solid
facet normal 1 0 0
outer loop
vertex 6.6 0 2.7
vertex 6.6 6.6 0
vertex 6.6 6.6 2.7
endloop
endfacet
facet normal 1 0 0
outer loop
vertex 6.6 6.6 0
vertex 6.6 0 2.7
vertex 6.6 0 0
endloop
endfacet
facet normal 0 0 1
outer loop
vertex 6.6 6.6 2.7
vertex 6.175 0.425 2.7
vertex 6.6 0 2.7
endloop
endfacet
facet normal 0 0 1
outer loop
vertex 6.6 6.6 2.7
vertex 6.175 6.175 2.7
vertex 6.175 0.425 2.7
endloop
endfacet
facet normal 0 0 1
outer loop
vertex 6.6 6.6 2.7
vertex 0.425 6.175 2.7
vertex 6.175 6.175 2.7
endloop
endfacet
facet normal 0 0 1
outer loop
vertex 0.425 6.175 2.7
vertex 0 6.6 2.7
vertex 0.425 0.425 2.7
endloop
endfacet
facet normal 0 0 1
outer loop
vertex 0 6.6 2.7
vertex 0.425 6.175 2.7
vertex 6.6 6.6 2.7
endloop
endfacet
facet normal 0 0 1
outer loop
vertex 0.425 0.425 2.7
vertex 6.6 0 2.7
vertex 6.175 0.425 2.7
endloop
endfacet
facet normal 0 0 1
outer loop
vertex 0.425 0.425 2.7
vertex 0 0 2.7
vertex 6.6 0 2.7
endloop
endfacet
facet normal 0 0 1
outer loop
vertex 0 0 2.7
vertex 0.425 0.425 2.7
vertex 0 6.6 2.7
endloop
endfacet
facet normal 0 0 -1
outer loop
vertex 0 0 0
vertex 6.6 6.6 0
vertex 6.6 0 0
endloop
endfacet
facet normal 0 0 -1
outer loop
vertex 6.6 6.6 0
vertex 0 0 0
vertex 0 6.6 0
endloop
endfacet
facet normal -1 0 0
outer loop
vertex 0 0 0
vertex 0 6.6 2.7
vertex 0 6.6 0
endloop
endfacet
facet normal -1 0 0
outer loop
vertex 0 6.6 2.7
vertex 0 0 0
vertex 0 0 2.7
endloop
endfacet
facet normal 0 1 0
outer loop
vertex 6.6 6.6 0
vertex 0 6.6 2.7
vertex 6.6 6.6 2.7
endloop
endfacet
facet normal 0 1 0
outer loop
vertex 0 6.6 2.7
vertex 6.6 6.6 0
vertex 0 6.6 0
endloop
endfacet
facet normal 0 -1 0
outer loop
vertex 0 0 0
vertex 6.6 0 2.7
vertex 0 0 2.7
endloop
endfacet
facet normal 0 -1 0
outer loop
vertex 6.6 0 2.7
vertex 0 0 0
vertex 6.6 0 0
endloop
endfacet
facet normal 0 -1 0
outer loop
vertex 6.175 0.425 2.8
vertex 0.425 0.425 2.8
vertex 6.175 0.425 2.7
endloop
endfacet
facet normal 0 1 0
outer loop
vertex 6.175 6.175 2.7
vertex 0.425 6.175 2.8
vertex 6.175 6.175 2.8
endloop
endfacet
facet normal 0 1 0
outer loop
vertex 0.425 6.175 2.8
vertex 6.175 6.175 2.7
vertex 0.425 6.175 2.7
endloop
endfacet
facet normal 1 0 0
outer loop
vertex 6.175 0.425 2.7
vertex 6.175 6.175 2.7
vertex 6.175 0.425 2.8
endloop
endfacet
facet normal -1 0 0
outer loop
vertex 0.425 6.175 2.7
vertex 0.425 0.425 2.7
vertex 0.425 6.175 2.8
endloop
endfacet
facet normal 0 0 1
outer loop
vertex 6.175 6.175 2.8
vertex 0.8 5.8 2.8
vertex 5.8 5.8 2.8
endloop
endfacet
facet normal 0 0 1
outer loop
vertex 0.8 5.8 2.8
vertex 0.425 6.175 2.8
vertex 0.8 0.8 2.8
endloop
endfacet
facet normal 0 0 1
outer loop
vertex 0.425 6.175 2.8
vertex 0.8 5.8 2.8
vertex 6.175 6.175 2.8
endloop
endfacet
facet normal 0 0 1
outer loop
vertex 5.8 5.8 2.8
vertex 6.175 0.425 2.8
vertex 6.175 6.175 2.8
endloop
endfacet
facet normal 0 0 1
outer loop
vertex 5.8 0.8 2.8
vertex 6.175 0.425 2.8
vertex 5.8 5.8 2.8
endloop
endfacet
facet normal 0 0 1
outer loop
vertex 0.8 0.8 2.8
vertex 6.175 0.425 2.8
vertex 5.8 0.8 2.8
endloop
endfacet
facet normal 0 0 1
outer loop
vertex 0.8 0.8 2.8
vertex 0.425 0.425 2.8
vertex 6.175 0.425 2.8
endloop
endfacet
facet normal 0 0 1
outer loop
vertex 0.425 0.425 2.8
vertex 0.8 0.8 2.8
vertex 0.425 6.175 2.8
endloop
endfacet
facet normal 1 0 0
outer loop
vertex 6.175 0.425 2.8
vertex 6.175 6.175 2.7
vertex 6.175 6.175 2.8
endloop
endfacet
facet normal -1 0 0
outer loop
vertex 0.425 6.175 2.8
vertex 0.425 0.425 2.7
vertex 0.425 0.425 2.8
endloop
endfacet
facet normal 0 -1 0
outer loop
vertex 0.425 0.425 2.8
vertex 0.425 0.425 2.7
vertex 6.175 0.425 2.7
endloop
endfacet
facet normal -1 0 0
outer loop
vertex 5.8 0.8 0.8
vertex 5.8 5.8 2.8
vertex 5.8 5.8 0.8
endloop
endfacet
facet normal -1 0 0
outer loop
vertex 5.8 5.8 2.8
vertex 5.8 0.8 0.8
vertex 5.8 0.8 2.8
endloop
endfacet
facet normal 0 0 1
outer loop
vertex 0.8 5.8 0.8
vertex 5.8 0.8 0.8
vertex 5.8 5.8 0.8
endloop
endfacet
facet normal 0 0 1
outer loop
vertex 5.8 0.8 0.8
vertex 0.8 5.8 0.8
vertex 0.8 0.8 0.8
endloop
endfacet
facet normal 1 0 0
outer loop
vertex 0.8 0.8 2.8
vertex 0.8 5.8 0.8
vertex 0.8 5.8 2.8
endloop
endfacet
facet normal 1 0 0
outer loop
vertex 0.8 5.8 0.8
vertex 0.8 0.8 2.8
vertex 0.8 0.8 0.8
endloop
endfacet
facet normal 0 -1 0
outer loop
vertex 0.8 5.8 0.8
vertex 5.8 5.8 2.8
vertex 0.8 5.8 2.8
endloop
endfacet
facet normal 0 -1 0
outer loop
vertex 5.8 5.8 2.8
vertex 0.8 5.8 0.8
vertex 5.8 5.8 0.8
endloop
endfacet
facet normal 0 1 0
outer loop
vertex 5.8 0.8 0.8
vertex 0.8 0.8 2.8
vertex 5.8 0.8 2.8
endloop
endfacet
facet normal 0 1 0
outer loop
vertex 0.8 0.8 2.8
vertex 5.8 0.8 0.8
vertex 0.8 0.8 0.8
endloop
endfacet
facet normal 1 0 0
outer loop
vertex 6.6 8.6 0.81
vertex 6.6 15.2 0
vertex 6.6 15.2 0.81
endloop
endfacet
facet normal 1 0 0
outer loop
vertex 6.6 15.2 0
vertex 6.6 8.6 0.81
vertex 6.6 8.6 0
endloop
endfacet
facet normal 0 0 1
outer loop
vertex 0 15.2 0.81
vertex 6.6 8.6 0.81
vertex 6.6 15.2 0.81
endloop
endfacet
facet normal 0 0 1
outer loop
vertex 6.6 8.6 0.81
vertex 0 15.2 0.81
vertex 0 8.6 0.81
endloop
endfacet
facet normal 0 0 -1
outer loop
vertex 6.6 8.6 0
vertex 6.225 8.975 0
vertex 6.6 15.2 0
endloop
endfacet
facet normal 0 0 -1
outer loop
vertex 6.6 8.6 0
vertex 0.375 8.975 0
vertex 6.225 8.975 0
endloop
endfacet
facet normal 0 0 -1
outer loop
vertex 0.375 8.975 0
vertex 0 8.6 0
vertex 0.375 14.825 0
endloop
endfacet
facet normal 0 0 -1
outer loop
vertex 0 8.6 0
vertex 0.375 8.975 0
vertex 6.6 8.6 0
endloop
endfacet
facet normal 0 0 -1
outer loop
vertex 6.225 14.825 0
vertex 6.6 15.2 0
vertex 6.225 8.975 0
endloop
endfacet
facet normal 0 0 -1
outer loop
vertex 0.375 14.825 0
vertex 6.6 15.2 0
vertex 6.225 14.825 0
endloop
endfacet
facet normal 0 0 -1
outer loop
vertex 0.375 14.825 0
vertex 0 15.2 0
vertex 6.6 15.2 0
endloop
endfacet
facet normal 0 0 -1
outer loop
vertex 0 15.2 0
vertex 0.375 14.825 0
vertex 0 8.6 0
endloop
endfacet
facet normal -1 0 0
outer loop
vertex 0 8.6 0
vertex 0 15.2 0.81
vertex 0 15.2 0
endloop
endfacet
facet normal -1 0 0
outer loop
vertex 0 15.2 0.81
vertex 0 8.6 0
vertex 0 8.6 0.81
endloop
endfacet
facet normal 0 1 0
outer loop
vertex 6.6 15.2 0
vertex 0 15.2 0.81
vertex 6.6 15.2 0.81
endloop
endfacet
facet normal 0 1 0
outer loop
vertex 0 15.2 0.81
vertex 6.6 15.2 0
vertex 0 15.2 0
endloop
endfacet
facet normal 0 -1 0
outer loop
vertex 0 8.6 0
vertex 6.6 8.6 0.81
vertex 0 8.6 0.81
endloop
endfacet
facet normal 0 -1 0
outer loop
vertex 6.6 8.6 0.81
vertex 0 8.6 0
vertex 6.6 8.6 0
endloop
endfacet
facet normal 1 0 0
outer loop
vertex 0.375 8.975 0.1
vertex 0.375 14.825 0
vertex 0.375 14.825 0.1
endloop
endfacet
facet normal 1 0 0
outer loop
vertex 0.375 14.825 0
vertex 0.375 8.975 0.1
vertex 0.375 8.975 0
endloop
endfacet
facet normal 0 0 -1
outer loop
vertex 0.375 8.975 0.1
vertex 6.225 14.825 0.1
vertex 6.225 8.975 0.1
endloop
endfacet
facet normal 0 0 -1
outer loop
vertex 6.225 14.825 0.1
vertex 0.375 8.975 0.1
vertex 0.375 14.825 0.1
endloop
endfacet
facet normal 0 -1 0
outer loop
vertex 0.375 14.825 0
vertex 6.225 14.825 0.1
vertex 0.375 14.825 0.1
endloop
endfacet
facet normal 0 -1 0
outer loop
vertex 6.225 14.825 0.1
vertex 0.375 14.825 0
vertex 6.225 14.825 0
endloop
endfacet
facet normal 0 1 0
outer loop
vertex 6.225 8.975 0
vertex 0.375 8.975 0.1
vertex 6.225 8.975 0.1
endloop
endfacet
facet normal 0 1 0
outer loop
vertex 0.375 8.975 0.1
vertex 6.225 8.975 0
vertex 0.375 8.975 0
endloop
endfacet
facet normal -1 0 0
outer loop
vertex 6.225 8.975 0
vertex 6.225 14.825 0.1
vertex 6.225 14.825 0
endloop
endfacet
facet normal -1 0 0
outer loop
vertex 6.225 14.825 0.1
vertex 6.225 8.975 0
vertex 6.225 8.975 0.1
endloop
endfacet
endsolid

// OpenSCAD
/* [Dimensioni principali della scatola]*/
// Altezza interna della scatola
h = 0; //[0:1:200]
// Larghezza interna della scatola
l = 0; //[0:1:200]
// Profondità interna della scatola
p = 2; //[0.1:.1:200]
// espanzione addizionale della scatole in altezza e larghezza
tl = 5; //[0:10]
//spessore delle pareti (dovrebbe essere un multiplo dell'ugello)
mu = .8;//[0.8 :0.4:10]
/*[parametriper il dentino di chiusura della scatola]*/
// larghezza del dentino in percentuale della parete
pd = 0.5; //[0.1: 0.1: 1]
// altezza del dentino di bloccaggio
ad = .1; // [0.1: 0.1 : 5]
// taglio trasversale del dente in percentuale della parete
td = 0; //[0 : 0.1 : 20]
// tolleranza extra tra i dentini e il coperchio
ext = 0.05;

/* [Parametri cosmetici] */
// raggio di curvatura delle stondature
r = 0;//[0:0.1:30]
// Stondature a base
Btype = "F"; // [F:senza stondature, E:uguale alle stondature, B:base allungata]
// millimetri in altezza delle stondature alla base
b = 0;//[0:0.1:100]
// Stondatura coperchio
Ctype = "F"; // [F:senza stondature, E: uguale alle stondature, B: coperchio allungato]

/* [Opzioni del modello]*/
// componenti da tracciare
Rtype = "E"; // [E:entrambi affianchati, S:Solo scatola, C:Solo coperchio, Z:sovreppposti con sezionamemto]
//lunghezza minima dei segmenti di un arco in mm
fs = 0.4;//[0.2:0.1:3]
// indica il numero massimo di segmenti che una circoferenza può avere
fn = 40;//[10:100]

/* [Parametri di controllo] */
// grandezza minima
Ep = 0.01;
// dimenzione dell'ugello di stampa
ud = 0.4; // [0.1: 0.1 : 0.6]
// altezza del disco di riferimento dell'ugello 
uh = 0.12;
// posizione del disco di riferimento dell'ugello
up = [1,1,1]; //[0 : 0.01 : 200]
s2 = sqrt(2);

Main(Rtype,Btype,Ctype, l+tl, h+tl, p, mu, ad, r, b, $fs=fs, $fn=fn);
//Dentini([l+tl, h+tl, p], mu, ad, ext/2, pd, td);
//#Dentini(io=0.3);
//Dente();

/* Nota(1)
  in un'equazione di secondo grado [a*x^2+b*x+c = 0]
	se a = 1 e b è divisibile per due
	allora  x= -b/2 +- sqrt((b/2)^2 -c)
*/
/* Formula(1)
// raggio minimo dipendente dal bordo interno della scatola
ct = m - Ep
d = sqrt(2*(r - ct)^2) +-> r>=d 
=>
  se
    r - ct >= 0 cioè ct >= r // prima della riduzione
  allora
    r^2 >= 2*(r - ct)^2
    r >= sqrt(2)*(r - ct)
  altrimetni
    r == +inf
=> 
  r >= sqrt(2)*r - sqrt(2)*ct
  r- sqrt(2)*r >= -sqrt(2)*ct 
  r * (1-sqrt(2) >= -sqrt(2)*ct
  r >= -sqrt(2)*ct/(1-sqrt(2))
  r >= sqrt(2)*ct/(sqrt(2)-1)
*/
/* Formula(2)
// raggio minimo dipendente dal dentino sulla scatola
c1 = r -m +pd*m +ext/2 +Ep
   = r -(1-pd)*m +Ep +ext/2
c2 = r -m +pd*m -pd*td*m +ext/2 +Ep
   = r -(1-pd+pd*td)*m +Ep -ext/2
d  = sqrt(c1^2 +c2^2) +-> r>=d
=>
  d = sqrt((r -(1-pd)*m +Ep +ext/2)^2 + (r -(1-pd+pd*td)*m  +Ep +ext/2)^2)
  mx = -(1-pd)*m +Ep +ext/2
  my = -(1-pd+pd*td)*m  +Ep +ext/2
  d = sqrt((r + mx)^2 + (r + my)^2)
  se
    r+mx >= 0 // lapalissiana per costruzione a meno di epsilon
	mx <= 0 // l'epsilon ha portato il dentino oltre al raggio ma la costruzione è ancora valida, inoltre questo impone al radicando ad essere positivo
	r+my >= 0 cioè my >= -r // prima della riduzione
  allora
	  r^2 >= (r + mx)^2 + (r + my)^2
	  r^2 >= r^2 +2*mx*r + mx^2 + r^2 +2*my*r + my^2
	  0 >= r^2 +2*(mx+my)*r + mx^2 +my^2
	  r^2 +2*(mx+my)*r + mx^2 +my^2 <= 0
	  r = -(mx+my) +- sqrt( (mx+my)^2 -(mx^2 + my^2))

  altrimenti
    r == +inf
*/
/* Formula(3)
// calcoliamo l'altezza del bordo della scatola sulla curvatura
d = sqrt(2*(r - m)^2)
h = sqrt( r^2 - d^2 ) = sqrt( r^2 - 2*(r-m)^2)
// rapportiamo quest'altezza all'altezza massima impostabile in modo che sia uguale al muro

hm ((r-h+Ep)/r) <= m
se r-h+Ep <> 0 // dovrebbe essere sempre vero per come abbiamo scelto r e m prima
hm <= (m * r)/(r-h+Ep)
hm <= (m*r)/(r - sqrt( r^2 - 2*(r-m)^2) +Ep)
*/
/* Formula(4)
// altezza e stondatura del coperchio
	// se il coperchio deve essere senza stondature 
	//     l'altezza dello stesso è uguale all'altezza del dentino più l'altezza del muro
	//     l'allungamento della testa del coperchio è zero
	// se deve averre la stessa curvatura delle stondature
	//     l'allungamento ha la stessa dimesione della stondatura
	//     l'ltezza è uguale dentino più l'altezza per assorbire la stondatura (o l'altezza del muro se maggiore)
	//     si seguono più o meno gli stessi ragionamenti del raggio minimo dipendente dal dentino e l'altezza dell'allungamento
		c1 = r -m +pd*m +ext/2 +Ep
		   = r -(1-pd)*m +Ep +ext/2
		c2 = r -m +pd*m -pd*td*m +Ep +ext/2
		   = r -(1-pd+pd*tm)*m +Ep +ext/2
		d  = sqrt(c1^2 +c2^2)
		d = sqrt((r -(1-pd)*m +Ep +ext/2)^2 + (r -(1-pd+pd*td)*m +Ep +ext/2)^2)
		mx = -(1-pd)*m +Ep +ext/2
		my = -(1-pd+pd*td)*m  +Ep +ext/2
		d = sqrt((r + mx)^2 + (r + my)^2)
		h = sqrt( r^2 - d^2 )
	// se si deve avere una base allungata 
	//     l'allungamento segue un ragionamento simile altezza dell'allungamento della base
	//     l'altezza è uguale al dentino più il muro
		hm ((r-h+Ep)/r)<= m
		hm <= (m * r)/(r-h+Ep)
		hm <= (m * r)/(r-h+Ep)
*/
// Main
module Main(RT="E", BT="F", CT="F", x=10, y=10, z=10, m, dente, r=2, bs=2) {
  
  DI = [x, y, z];
  DE = ComposeOut(DI, m, dente);
  Provetta();

  // ************************************************************
  // le dimenzioni del muro limitano l'arrotondamento orizzontale
  //l'arrotondamento della scatola non può essere maggiore della metà della lunghezza o larghezza
  // ************************************************************
  // limite imposto dalle dimezioni della scatola
  ds = min(DE[0], DE[1])/2 -Ep; 
  // ************************************************************
  // limite agli stodamenti per la dimenzione del muro
  // ************************************************************
  // vedi formula(1)
  rm = m-Ep >=r ? 1/0 : (s2*(m-Ep))/(s2-1); 
  
  // ************************************************************
  // limite degli stondamenti per le impostazioni del dentino
  // ************************************************************
  // vedi formula(2)
  mx = min(0,-(1-pd)*m +Ep -ext/2);
  my = -(1-pd+pd*td)*m +Ep -ext/2;
  echo(Mx=mx,My=my);
  rd = my < -r ? 1/0 : (-(mx + my) + sqrt(pow(mx+my,2) - ((mx*mx) + (my*my))));
  
  echo(    "<b>Raggio Massimo<\b>");
  echo(str("<b>__per le dimensioni : </b>",ds));
  echo(str("<b>__per la scatola    : </b>",rm));
  echo(str("<b>__per il dentino    : </b>",rd));
  r1 = min(r, ds, rm, rd);
  
  // definito il raggio definiamo gli allungamenti
  
  // ************************************************************
  // allungamento massim della base
  // ************************************************************
  // vedi Formula(3)
  hb1 =  sqrt(r1*r1-2*pow(r1-m,2))/r1;
  bm1 = m/(1- hb1+Ep);
  echo(str("<b>Altezza Massima dell'allungamento alle base : </b>", bm1," [", hb1, "]"));
  
  bsm = BT == "F" ? 0: BT == "E" ? min(r1,bm1) : min(bs,bm1);
  
  // ************************************************************
  // allungamento massimo e altezza coperchio
  // ************************************************************
  // vedi Formula(4)
  cx = min(0,-(1-pd)*m +Ep +ext/2);
  cy = -(1-pd+pd*td)*m +Ep +ext/2;
  dc = pow(r1+cx, 2) + pow(r1+cy, 2);
  echo(Cx=cx,Cy=cy, Dc=dc, R = r1);
  hc = max(0,sqrt( pow(r1,2) - dc));
  bm2 = (m *r1)/(r1-hc+Ep);
  echo(str("<b>Altezza Massima dell'allungamento coperchio : </b>", bm2," [", hc, "]"));

  hb = max((CT == "E" ? max(m,r1-hc+Ep)+dente : CT == "B"? dente +m: r1+m), r1) +Ep;
  bc = CT == "F" ? 0 : CT == "B"? min(hb-Ep,bm2) : r1;  
  
  // ************************************************************
  // inizio direttive delle forme
  // ************************************************************
  
  if(RT == "E" || RT == "S" ) { Scatola(DI, m, dente, r1, bsm); }
  if(RT == "C")  Coperchio(DI, hb, m, dente, r1, bc);
  
  sx = DE[0]  < DE[1] ? DE[0]+2 : 0;
  sy = DE[1] <= DE[0] ? DE[1]+2 : 0;
  if(RT == "E") translate([sx , sy, 0]) Coperchio(DI, hb, m, dente, r1, bc);

  if(RT == "Z") {
    difference(){
      union() {
        Scatola(DI, m, dente, r1, bsm);
        translate([0, 0, DE[2]+dente*0.6]) Coperchio(DI, hb, m, dente, r1, bc);
      }
      translate ([-0.1, -0.1, -0.1]) cube([DE[0]/2, DE[1]/2, DE[2]+hb+dente]);
      translate([DE[0], DE[1]/2, -0.1]) resize([DE[0], DE[1]/2, 0])rotate([0,0,45])
          cube([1, 1, DE[2]+hb+dente]);
    }
  }
  if(RT == "dbg") {
    Dentini(dimInt, muro);
  }
}
//
function ComposeOut(dimInt, m, dente) = [
    dimInt[0] + 2*m,
    dimInt[1] + 2*m,
    dimInt[2] + m - dente];

//
module Scatola(DI=[10,10,10], m, dente, r, b) {
  DE= ComposeOut(DI, m, dente);

  b1 = min(b, DE[2]-Ep);
  echo("<b>Scatola</b>", DI, M=m, dente, R=r, Bh=b1, DE);

  difference() {
    union() {
      RoundCube(DE, r, b1);
      color("orange",1)
      translate([0, 0, DE[2]]) Dentini(DI, m, dente, -ext/2, pd, td );
    }
    translate([m, m, m]) color("green",1)  cube([DI[0], DI[1], DI[2]+.1]);
  }
}
/*
 * dimInt = dimesioni interne della scatola [w,d]
 */
module Dentini(DI=[10,15,5], l, alt, esp = 0, pd = 0.5, prd = 0) {
  
  dente = l*pd;
  rid = dente*prd;
  dx = DI[0] + 2*(dente + esp);
  dy = DI[1] + 2*(dente + esp);
  
  DE=ComposeOut(DI, l, alt);
  echo("<b>Dentini</b>", dim=DE, caratt=[dx ,dy, dente, rid], m=l, peso=pd, espansione=esp);
  
  Provetta();
  if(false) {  
    %translate([0,0,-0.01])
    difference() {
      cube([DE[0], DE[1], 0.1]);
      translate([l, l, -0.01]) cube([DI[0], DI[1],  0.12]);
    }   
  }
  E2  =Ep/2;
  translate([l-dente-esp, l-dente-esp, 0])
  hull() difference() {
    translate([0, 0, 0])cube([dx,dy,alt]);
    translate([  -E2,   -E2, -Ep]) rotate([0,0,  0]) Rettangolo(rid+Ep, alt+2*Ep);
    translate([dx+E2,   -E2, -Ep]) rotate([0,0, 90]) Rettangolo(rid+Ep, alt+2*Ep);
    translate([dx+E2, dy+E2, -Ep]) rotate([0,0,180]) Rettangolo(rid+Ep, alt+2*Ep);
    translate([  -E2, dy+E2, -Ep]) rotate([0,0,270]) Rettangolo(rid+Ep, alt+2*Ep);
  }
}
//
module Dente( w = 10, d=3, h = 3) {
  //#cube([w,d,h]);
  pw = min (1.5, w-0.1, d-0.1);
  ph = min (1.9, h-0.1);
  translate([pw/2, pw/2,0])
  minkowski() {
    cube([w-pw, d-pw, h-ph], false);
    PyramidThrunk(ph, pw, 0.001);
  }
}

//
module Coperchio( DI=[10,10,10], h, m, dente, r=0, b=0) {
  DE = ComposeOut(DI, m, dente);
  
  echo("<b>Coperchio</b>", [DE[0],DE[1],h], m, dente, R=r, T=b);
  difference() {
    RoundCube([DE[0], DE[1], h], r, 0, b);
    translate ([0,0, -Ep]) color("gray", 1) 
      Dentini(DI, m, dente+Ep, ext/2, pd, td);
    //translate ([0,0, 0])cube([ dimExt[0], dimExt[1]/2,altezza+0.01]);
  }
}

//
module RoundCube(v = [1,1,1], r = 0, rb = -1, rt = -1) {
  echo( "<b>RoundCube</b>", dim=v, r=r, base=rb, top=rt);
  consistentWidthRound = r > 0 && 2*r < v[0] && 2*r < v[1];
  maxb = max(0.01, max(rb, 0) + max(rt, 0));
  echo(maxb);
  consistentHeightRound = maxb >= 0 && maxb < v[2];
  if(consistentWidthRound && consistentHeightRound){
    echo("ok");
    translate([r, r, 0]){
      minkowski() {
        cube([v[0]-2*r, v[1]-2*r, v[2]-maxb]);
        ScalpelloMk(r, rt, rb, maxb);
      }
    }
  } else {
    cube(v);
  }
}

//
module Pyramid(h=2, b=2) {
	if( h>0 && b>0){
		p1 = b/2;
		polyhedron(
			[[ p1,  p1, 0],//0
			 [ p1, -p1, 0],
			 [-p1, -p1, 0],
			 [-p1,  p1, 0],
			 [ -0,   0, h]],//4
			[[0,1,2,3],  // bottom
			 [0,1,4],
			 [1,2,4],
			 [2,3,4],
			 [3,0,4]]
		);
	}
}
//
module PyramidThrunk(h = 2, b1=3, b2=1) {
  if(h>0 && b1>0 && b2 >=0) {
    if( b2==0) {
      Pyramid(h, b1);
    } else {
      p1 = b1/2;
      p2 = b2/2;
      polyhedron(
        [[ p1,  p1, 0],//0
         [ p1, -p1, 0],
         [-p1, -p1, 0],
         [-p1,  p1, 0],
         [ p2,  p2, h],
         [ p2, -p2, h],
         [-p2, -p2, h],
         [-p2,  p2, h]],//7
        [[0,1,2,3],  // bottom
         [4,5,1,0],  // front
         [7,6,5,4],  // top
         [5,6,2,1],  // right
         [6,7,3,2],  // back
         [7,4,0,3]] // left]
      );
    }
  }
} 
//
//ScalpelloMk(0.2,.2,.7,.5, $fn=40);
module ScalpelloMk(r = 0, ru = 0, rl = 0, h = 1) {
  echo("<b>Scalpello</b>",h=h, r=r, ru=ru, rl=rl);
  h1 = h-max(0,rl)-max(0,ru);
  if(r > 0){
    translate([0, 0, max(0,rl)]) 
      hull(){
        if(ru > 0) {
          translate([0, 0, max(0,h1)])
          HalfEllissoid(r, ru);
        }
        if(h1>0){
          cylinder(h=h1, r=r);
        }
        if(rl > 0){
          
          mirror([0,0,1]) HalfEllissoid(r, rl);
        }
      }
  }
}
//
module Rettangolo(l, h){
 polyhedron(
        [
         [ 0,  0, 0],//0
         [ 0,  l, 0],
         [ l,  0, 0],
         [ 0,  0, h],
         [ 0,  l, h],
         [ l,  0, h] //5
        ],
        [
         [0,2,1],  // bottom
         [0,1,4,3],  // cateto1
         [1,2,5,4], //ipo
         [0,3,5,2], // cateto2
         [3,4,5] //sotto
        ]
      );
}
//
module HalfEllissoid(r1 = 1, r2 = 1) {
  resize([2*r1, 2*r1, r2]) HalfSphere(r1);
}
//
module HalfSphere(r = 0, reduction= "none") {
  if(r>0) {
    hull() difference() {
      sphere(r);
      translate([-r, -r, -2*r]) cube(2*r, center = false);
      if(reduction == "half" || reduction == "quarter") translate([-r, -2*r, 0]) cube(2*r, center = false);
      if(reduction == "quarter") translate([-r, 0, 0]) cube(r, center = false);
    }
  }
}
//
module Provetta() {
  //translate(up)cylinder(d=ud, h=uh);
 }
